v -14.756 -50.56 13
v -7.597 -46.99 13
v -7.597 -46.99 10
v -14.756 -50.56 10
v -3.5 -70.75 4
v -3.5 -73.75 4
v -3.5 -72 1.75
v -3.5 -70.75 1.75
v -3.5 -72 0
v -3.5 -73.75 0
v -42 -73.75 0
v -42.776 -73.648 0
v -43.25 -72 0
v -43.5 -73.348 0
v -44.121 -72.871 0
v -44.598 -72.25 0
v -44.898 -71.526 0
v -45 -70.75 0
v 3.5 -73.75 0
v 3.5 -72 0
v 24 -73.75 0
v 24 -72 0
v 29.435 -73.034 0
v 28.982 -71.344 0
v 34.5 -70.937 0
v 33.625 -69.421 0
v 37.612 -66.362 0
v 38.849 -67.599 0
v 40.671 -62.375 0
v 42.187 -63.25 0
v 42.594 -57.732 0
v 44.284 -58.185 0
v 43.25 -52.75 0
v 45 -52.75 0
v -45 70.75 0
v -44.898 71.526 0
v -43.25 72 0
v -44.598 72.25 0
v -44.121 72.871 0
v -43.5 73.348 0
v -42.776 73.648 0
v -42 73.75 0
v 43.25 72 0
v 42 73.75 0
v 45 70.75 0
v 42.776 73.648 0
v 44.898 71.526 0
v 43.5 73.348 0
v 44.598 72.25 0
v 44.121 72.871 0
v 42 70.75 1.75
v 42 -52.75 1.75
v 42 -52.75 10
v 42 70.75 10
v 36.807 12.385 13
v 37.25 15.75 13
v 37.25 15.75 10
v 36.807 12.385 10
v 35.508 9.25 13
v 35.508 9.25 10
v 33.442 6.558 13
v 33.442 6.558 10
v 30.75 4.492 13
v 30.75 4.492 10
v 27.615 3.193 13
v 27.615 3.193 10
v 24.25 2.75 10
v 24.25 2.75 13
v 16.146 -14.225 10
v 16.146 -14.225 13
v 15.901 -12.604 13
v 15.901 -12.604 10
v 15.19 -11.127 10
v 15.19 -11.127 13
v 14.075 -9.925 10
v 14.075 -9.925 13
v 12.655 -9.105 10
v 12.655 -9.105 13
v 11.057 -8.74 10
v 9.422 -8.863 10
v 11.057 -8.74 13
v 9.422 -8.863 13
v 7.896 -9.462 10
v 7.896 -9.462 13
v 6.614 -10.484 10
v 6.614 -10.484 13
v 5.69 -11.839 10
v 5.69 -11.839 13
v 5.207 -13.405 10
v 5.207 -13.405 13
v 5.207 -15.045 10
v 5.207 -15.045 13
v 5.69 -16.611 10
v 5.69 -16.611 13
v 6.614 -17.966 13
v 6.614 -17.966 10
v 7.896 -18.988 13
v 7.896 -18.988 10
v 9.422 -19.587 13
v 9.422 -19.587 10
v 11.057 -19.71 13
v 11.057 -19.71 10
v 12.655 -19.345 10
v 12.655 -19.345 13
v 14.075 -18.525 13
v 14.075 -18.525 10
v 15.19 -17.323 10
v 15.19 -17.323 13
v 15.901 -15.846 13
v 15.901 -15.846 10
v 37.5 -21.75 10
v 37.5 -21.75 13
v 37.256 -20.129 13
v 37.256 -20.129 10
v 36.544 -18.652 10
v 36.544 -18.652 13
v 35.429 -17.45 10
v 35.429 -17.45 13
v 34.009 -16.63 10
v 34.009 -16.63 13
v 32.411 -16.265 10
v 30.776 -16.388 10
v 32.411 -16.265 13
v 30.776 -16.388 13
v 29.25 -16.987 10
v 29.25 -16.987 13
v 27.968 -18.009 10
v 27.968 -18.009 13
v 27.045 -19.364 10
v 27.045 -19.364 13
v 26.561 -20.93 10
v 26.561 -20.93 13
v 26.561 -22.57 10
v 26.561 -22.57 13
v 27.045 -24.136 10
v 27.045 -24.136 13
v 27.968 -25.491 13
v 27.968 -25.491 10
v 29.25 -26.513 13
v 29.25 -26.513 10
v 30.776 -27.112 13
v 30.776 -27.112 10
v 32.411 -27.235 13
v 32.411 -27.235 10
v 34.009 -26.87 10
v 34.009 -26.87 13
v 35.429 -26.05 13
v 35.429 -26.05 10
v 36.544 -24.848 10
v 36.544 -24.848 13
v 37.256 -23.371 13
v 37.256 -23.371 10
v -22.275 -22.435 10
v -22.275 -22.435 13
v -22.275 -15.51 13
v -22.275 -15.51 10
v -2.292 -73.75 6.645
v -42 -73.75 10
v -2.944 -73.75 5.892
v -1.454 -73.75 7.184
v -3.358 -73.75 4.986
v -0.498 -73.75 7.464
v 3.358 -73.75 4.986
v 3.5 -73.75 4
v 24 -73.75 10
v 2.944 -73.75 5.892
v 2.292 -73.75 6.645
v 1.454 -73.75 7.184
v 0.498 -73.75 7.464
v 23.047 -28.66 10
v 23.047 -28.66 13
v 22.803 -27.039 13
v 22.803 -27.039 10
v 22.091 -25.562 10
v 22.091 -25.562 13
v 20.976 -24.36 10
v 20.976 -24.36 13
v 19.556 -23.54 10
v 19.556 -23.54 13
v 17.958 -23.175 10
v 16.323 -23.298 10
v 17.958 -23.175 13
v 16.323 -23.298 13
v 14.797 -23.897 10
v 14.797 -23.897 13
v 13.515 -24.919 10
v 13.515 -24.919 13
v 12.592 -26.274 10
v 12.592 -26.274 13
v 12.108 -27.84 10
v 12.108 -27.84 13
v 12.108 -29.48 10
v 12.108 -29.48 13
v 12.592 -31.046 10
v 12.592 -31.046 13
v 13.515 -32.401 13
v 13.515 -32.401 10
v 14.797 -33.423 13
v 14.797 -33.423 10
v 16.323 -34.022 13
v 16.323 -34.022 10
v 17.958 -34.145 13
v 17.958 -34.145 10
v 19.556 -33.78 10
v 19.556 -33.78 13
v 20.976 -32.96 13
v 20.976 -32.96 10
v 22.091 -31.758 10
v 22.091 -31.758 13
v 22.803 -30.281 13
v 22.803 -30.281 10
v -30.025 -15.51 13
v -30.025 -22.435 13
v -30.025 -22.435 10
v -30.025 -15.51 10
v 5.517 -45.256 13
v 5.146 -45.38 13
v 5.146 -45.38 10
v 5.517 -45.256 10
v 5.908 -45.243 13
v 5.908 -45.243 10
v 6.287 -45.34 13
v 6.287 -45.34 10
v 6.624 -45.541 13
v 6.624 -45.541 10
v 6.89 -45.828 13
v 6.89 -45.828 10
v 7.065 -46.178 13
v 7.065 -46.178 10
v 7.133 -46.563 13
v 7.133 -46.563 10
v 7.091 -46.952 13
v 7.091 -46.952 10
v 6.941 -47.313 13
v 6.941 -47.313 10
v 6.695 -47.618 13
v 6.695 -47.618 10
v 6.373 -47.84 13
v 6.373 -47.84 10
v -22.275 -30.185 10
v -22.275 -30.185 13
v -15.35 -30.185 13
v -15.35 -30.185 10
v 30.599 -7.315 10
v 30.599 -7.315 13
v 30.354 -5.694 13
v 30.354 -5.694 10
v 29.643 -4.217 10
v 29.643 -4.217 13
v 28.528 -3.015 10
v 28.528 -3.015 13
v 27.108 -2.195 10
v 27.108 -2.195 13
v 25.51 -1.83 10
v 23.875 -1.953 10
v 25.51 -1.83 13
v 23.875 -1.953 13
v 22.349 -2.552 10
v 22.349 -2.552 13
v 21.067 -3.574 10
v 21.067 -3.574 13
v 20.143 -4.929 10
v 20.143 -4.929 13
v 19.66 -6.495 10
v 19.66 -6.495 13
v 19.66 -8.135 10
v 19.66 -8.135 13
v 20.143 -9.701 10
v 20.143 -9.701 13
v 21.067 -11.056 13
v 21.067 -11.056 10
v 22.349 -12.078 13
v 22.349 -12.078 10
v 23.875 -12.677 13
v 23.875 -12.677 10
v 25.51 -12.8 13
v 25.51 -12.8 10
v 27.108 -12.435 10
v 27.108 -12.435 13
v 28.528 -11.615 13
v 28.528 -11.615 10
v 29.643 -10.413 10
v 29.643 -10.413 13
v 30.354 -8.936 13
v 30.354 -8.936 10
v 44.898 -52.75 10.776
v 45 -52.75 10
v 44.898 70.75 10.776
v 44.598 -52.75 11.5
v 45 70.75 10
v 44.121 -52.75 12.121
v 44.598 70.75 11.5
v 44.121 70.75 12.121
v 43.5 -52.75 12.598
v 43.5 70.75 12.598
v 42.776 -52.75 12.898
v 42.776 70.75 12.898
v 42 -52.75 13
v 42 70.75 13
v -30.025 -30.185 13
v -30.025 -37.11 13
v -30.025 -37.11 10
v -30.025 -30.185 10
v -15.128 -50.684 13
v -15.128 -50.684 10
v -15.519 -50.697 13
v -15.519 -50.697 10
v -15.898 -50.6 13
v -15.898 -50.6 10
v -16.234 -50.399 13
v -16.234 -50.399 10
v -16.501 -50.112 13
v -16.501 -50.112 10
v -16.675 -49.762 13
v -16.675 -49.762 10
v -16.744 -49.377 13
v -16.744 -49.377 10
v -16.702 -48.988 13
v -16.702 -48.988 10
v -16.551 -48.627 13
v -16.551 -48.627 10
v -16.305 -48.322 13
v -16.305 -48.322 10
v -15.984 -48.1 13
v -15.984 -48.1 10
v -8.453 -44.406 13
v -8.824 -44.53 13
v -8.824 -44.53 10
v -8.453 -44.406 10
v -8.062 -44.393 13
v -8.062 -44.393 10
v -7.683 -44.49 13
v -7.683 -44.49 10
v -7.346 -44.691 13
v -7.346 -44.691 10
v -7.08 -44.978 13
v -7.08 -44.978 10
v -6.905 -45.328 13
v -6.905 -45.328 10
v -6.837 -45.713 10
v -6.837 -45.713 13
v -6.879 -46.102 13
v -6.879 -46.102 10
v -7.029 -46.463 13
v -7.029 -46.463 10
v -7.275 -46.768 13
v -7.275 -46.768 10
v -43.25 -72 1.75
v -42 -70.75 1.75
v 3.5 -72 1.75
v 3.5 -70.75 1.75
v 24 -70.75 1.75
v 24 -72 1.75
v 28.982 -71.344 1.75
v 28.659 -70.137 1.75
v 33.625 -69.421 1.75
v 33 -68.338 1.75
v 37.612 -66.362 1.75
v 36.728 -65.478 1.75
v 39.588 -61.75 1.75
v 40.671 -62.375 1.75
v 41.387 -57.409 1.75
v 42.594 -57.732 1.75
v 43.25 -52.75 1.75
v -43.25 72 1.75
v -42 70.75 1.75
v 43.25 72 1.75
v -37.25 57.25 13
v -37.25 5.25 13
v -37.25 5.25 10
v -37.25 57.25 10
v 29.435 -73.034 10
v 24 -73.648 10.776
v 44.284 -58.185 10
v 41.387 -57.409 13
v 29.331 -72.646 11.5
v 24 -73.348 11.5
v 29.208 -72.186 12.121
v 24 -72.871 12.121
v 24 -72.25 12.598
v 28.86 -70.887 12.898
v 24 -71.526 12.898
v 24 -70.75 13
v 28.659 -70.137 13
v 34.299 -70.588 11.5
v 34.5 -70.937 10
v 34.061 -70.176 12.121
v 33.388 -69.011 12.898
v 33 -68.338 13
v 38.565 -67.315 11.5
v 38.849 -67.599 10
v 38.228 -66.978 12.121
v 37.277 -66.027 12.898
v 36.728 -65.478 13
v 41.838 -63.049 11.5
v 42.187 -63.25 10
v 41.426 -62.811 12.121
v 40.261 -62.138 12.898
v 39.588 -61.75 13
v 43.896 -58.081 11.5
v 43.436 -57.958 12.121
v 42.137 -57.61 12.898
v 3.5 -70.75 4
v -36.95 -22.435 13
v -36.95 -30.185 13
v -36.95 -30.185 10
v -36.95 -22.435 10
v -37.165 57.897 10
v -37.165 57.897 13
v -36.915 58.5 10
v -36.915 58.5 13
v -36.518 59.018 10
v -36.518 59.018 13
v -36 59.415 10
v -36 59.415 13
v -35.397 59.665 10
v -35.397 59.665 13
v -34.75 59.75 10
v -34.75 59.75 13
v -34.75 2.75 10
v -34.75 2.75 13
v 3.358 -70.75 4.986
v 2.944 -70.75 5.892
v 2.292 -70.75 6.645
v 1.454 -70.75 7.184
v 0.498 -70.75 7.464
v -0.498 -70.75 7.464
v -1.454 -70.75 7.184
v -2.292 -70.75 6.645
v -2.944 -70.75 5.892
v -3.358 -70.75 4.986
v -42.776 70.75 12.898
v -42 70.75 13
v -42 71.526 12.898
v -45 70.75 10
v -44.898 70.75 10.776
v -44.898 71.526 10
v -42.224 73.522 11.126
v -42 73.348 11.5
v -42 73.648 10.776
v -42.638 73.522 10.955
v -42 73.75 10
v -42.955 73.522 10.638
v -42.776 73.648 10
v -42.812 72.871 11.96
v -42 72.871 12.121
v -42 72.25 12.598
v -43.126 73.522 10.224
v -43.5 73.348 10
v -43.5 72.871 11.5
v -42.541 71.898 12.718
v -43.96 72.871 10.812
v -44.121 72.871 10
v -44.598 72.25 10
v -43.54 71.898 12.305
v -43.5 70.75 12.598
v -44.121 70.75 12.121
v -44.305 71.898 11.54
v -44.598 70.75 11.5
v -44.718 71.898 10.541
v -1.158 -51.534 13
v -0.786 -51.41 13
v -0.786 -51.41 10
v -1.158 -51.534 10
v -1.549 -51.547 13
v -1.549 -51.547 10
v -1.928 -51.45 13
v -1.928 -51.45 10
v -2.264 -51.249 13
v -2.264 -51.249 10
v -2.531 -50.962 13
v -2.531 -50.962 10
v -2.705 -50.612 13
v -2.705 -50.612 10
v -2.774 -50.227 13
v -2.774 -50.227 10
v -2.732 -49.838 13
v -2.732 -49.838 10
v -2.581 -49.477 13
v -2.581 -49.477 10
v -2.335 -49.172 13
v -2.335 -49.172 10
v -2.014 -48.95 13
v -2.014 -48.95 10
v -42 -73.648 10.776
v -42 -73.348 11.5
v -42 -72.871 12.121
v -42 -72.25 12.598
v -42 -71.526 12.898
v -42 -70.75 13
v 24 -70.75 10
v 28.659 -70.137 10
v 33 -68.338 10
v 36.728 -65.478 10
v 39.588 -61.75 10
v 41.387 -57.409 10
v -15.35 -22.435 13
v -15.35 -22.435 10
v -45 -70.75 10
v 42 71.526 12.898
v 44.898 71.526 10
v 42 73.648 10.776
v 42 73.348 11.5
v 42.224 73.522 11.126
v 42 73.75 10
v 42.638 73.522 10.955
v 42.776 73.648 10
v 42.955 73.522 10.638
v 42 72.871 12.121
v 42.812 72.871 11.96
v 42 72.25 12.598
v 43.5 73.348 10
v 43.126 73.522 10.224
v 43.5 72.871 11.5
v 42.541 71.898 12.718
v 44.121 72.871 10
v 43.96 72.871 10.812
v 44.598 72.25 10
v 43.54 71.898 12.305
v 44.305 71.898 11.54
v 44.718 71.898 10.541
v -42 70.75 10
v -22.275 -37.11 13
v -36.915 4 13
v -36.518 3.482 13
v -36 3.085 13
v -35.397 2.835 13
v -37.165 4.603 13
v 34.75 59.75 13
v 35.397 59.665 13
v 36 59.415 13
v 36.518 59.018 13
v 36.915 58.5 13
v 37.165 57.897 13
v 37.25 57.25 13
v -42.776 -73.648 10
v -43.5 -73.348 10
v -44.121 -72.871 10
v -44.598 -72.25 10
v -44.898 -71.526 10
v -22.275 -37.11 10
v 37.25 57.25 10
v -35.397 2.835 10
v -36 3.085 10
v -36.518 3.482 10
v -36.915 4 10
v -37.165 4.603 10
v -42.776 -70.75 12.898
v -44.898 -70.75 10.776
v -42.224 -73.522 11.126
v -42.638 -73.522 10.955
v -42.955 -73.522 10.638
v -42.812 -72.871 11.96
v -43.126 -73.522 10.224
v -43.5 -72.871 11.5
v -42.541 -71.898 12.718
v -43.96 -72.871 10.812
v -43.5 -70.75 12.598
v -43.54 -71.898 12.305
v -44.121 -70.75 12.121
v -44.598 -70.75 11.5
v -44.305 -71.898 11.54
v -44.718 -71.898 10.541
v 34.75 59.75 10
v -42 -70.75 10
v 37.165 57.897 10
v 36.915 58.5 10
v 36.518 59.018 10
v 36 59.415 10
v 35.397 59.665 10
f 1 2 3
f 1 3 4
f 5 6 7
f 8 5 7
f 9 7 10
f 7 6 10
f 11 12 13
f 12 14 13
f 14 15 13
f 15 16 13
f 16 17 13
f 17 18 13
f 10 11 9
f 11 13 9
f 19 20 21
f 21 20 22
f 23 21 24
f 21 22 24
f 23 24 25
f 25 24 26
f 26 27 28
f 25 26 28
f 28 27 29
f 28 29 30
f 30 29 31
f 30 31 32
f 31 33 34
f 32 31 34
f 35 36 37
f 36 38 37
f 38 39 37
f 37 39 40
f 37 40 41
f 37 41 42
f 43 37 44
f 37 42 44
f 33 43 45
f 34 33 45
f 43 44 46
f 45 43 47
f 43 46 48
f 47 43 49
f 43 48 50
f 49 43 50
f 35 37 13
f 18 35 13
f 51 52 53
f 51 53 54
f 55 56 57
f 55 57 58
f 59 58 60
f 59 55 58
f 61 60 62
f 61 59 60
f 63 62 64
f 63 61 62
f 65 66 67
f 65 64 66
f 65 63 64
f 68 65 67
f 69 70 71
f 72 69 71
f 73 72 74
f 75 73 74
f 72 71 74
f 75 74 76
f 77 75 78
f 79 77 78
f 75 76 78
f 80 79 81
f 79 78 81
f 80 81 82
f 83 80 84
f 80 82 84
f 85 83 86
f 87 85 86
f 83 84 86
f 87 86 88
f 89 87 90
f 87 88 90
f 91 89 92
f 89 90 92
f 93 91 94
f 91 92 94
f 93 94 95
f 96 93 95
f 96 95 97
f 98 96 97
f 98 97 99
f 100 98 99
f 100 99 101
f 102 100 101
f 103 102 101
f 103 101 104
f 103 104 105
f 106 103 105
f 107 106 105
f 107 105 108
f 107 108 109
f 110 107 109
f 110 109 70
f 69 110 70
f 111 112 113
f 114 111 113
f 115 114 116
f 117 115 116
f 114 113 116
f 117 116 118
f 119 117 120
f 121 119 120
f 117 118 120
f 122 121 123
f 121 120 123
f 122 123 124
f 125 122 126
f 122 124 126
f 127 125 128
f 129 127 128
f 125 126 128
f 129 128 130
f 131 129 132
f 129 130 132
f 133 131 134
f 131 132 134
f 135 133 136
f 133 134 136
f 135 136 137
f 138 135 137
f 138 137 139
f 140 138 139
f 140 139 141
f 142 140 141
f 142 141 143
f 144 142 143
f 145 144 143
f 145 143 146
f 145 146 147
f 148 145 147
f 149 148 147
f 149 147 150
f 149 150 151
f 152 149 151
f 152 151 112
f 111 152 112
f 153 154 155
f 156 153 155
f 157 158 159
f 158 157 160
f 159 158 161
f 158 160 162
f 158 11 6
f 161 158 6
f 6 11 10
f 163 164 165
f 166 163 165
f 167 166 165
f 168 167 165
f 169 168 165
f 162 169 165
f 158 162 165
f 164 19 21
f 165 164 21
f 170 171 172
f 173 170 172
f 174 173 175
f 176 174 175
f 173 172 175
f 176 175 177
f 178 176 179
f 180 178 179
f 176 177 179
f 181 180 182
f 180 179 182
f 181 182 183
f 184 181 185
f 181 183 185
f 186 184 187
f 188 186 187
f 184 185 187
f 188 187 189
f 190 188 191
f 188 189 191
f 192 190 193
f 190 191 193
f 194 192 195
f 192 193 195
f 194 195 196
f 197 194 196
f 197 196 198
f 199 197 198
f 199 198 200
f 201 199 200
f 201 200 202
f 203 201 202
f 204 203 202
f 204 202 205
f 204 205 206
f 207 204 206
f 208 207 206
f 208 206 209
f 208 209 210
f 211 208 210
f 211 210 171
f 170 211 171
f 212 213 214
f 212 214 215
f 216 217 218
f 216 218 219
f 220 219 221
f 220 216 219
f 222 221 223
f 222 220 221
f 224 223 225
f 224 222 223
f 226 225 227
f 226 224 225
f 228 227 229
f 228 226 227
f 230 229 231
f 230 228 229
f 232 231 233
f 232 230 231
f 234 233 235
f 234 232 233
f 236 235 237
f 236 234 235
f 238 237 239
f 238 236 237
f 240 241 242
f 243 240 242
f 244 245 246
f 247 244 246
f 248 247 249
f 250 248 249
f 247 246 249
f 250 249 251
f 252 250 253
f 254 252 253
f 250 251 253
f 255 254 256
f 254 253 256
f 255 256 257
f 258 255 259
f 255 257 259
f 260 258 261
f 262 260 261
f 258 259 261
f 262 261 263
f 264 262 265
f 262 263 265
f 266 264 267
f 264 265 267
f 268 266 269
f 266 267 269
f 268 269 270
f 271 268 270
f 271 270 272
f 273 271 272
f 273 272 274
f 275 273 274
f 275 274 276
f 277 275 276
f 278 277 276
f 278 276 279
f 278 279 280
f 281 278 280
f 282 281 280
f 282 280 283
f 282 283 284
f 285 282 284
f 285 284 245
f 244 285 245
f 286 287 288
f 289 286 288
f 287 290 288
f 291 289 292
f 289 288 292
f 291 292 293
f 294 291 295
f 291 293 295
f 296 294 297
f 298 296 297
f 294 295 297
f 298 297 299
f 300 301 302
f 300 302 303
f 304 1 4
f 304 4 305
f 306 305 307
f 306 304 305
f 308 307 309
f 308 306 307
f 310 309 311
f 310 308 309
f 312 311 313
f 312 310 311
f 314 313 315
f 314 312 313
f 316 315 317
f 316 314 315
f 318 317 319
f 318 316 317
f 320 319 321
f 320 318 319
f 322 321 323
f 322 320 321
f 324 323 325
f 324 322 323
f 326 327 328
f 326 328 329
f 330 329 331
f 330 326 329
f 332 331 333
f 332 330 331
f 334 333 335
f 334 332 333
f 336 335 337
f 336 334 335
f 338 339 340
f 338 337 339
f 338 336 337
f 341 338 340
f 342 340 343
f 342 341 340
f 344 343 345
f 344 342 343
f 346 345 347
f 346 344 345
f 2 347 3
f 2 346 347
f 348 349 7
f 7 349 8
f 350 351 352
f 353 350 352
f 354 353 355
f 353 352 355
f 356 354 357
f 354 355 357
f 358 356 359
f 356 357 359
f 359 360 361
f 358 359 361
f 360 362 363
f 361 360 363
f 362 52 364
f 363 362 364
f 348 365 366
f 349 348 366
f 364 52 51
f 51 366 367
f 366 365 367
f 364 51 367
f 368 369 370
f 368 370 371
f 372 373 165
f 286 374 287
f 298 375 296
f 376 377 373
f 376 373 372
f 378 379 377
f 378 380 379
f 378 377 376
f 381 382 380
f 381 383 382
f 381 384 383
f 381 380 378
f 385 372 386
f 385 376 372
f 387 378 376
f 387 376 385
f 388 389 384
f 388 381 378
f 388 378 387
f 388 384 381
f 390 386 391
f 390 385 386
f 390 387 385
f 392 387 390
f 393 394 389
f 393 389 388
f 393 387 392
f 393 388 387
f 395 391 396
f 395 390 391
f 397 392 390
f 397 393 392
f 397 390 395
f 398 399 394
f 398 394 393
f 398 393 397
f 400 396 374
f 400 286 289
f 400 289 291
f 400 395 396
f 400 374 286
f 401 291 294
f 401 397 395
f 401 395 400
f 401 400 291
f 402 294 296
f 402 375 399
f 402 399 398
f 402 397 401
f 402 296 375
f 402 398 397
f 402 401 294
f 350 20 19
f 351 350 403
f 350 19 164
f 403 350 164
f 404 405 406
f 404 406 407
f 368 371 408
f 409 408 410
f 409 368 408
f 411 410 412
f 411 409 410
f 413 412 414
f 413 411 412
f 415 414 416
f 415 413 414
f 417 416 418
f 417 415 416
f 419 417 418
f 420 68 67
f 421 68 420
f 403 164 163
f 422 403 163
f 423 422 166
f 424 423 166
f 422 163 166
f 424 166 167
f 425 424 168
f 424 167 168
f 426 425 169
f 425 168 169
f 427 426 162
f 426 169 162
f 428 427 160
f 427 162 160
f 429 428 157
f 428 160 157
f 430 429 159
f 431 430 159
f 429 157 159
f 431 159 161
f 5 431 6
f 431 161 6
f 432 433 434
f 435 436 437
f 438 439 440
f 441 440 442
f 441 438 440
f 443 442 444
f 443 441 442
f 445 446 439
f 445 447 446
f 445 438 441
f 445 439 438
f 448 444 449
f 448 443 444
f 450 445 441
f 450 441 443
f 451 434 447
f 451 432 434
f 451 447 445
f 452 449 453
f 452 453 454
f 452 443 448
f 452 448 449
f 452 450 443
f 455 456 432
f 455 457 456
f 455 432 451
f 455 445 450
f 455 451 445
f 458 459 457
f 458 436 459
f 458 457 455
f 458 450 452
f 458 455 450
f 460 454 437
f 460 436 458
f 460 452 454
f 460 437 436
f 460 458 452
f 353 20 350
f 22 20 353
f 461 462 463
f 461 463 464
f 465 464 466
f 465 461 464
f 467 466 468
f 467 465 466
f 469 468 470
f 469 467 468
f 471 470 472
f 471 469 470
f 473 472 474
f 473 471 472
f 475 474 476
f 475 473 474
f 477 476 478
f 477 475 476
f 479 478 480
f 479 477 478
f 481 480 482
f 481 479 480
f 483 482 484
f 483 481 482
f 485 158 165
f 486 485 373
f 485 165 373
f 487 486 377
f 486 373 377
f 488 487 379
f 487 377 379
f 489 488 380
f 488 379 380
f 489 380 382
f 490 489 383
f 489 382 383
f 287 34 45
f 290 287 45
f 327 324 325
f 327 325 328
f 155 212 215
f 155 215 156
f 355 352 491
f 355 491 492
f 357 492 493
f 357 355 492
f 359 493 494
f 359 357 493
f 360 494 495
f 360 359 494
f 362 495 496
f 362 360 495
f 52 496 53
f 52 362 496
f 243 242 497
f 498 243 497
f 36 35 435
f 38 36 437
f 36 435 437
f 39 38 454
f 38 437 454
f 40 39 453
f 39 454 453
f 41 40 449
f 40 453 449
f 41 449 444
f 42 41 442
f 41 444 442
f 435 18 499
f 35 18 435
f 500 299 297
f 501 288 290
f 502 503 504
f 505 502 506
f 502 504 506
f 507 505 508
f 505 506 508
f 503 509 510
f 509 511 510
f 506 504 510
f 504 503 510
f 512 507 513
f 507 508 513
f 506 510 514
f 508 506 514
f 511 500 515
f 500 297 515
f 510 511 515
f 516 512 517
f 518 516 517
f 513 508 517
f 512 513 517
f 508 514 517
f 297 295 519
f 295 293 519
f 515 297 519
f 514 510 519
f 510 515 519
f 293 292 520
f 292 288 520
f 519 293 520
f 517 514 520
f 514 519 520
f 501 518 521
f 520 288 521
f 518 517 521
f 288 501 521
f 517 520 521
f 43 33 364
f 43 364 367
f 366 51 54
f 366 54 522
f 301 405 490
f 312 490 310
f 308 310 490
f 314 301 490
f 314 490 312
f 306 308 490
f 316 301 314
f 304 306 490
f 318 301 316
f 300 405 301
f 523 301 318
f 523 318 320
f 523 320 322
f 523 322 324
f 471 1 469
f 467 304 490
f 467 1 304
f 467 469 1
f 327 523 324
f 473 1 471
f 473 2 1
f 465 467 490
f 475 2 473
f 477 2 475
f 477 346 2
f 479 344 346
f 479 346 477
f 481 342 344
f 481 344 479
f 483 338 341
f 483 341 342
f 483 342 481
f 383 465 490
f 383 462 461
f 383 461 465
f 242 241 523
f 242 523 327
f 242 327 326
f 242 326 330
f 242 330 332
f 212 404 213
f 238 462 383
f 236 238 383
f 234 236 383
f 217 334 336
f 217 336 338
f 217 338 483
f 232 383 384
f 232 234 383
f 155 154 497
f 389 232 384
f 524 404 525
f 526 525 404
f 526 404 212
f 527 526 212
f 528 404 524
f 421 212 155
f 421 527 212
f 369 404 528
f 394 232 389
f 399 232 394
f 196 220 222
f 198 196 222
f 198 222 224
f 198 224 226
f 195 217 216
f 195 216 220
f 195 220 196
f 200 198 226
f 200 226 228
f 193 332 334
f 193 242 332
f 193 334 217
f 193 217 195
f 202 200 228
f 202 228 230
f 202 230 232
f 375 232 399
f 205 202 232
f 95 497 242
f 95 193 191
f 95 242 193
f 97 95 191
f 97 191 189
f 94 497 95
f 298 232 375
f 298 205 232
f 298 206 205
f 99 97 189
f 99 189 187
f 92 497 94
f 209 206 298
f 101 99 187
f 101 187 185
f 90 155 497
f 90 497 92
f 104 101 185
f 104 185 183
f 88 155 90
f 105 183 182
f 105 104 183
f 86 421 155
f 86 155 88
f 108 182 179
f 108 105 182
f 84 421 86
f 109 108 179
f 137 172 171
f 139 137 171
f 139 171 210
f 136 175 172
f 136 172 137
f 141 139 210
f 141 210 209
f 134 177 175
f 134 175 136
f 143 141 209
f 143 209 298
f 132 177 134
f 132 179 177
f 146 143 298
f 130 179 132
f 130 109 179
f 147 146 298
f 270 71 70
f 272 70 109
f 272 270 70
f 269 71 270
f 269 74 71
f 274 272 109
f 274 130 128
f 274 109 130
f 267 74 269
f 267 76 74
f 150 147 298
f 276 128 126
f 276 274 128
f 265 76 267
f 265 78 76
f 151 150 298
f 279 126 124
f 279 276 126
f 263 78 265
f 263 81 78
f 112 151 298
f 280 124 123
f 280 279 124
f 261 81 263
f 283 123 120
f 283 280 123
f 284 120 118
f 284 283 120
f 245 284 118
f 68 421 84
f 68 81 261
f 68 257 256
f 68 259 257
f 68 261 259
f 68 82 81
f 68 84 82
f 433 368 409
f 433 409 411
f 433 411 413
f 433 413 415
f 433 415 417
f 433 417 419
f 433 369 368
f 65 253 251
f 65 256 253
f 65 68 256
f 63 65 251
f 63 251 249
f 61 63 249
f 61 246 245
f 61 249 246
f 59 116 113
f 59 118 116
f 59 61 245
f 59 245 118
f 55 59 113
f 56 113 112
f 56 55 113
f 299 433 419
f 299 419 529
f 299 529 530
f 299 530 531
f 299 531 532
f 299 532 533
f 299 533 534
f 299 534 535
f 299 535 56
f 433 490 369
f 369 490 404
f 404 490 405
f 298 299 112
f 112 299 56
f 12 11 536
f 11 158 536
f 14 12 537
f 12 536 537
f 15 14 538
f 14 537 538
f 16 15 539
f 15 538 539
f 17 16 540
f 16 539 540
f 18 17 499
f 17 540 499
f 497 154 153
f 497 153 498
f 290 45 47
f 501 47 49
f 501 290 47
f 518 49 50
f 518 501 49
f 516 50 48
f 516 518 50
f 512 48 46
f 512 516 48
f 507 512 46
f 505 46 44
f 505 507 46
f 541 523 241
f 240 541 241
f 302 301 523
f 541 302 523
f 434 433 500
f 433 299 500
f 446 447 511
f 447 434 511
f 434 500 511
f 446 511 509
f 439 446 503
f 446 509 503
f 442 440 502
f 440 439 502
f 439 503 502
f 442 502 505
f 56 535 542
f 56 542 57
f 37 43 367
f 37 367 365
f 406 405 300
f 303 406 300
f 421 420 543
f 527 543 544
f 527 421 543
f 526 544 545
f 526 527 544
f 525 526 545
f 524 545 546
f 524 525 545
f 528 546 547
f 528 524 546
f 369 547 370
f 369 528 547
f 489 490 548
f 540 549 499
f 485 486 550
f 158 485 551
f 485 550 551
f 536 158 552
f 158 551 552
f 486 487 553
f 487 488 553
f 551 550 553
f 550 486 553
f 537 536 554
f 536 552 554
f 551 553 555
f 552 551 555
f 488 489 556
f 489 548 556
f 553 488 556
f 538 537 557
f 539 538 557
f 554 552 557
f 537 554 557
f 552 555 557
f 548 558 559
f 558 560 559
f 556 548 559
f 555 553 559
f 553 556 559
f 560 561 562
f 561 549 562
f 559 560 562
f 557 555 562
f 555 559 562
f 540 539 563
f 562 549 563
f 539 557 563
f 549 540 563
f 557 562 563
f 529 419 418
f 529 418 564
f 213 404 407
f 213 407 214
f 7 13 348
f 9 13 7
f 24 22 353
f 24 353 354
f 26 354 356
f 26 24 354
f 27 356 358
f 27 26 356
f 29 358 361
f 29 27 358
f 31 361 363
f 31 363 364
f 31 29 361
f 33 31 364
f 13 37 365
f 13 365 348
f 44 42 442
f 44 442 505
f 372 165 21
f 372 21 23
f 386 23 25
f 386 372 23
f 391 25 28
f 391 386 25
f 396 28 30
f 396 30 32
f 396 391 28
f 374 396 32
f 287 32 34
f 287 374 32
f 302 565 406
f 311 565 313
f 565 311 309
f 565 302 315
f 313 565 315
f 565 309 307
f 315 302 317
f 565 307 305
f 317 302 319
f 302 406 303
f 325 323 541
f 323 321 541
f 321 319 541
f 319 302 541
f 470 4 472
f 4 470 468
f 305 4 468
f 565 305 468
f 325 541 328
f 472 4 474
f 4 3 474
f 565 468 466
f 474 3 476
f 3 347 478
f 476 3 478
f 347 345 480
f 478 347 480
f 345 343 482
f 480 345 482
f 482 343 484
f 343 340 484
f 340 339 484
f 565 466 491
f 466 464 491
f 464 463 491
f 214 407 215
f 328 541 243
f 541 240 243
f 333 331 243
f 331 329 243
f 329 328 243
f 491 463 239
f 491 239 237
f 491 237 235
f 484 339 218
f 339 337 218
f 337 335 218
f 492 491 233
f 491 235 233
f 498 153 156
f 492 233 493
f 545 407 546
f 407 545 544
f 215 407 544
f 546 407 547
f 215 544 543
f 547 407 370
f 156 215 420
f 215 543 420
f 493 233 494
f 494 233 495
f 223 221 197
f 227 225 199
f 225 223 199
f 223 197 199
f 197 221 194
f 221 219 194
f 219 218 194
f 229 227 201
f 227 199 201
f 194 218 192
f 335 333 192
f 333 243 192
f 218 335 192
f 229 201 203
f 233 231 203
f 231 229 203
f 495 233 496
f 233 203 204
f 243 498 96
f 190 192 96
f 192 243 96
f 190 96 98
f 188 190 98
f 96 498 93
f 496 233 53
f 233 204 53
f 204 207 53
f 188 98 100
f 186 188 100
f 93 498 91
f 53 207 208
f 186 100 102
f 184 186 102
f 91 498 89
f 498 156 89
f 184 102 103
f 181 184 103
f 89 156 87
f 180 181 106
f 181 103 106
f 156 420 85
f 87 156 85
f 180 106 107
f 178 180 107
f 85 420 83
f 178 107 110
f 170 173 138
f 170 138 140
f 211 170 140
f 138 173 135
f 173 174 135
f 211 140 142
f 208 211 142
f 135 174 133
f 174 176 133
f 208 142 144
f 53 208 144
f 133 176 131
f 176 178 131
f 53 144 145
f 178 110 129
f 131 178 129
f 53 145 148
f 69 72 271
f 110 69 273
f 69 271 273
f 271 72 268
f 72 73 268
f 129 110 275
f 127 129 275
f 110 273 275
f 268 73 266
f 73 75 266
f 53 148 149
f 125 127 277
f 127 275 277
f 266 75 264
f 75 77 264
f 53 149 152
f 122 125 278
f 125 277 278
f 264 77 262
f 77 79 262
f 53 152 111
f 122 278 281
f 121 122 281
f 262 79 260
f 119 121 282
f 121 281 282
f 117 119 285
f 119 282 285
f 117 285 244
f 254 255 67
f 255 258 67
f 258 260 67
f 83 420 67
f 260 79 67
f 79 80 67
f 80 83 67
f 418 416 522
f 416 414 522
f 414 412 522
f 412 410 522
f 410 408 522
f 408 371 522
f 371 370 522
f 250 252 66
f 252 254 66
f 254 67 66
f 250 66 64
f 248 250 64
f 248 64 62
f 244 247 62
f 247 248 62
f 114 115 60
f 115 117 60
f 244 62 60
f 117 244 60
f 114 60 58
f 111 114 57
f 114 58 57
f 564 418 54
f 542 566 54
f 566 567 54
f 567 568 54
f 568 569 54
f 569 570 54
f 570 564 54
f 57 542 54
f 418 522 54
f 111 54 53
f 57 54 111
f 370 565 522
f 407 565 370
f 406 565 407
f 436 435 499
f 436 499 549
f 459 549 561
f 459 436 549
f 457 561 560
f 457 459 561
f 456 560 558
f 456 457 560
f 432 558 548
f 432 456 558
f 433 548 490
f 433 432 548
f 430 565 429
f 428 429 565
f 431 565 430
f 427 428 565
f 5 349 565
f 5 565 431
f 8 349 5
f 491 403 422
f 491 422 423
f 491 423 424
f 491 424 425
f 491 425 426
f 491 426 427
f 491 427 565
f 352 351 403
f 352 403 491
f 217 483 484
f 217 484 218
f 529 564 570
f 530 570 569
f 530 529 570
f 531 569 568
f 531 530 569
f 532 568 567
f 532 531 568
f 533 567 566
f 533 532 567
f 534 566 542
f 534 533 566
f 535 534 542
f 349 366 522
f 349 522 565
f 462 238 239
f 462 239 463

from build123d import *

# Parameters (mm, degrees)
SKETCH1_W               = 90
SKETCH1_H               = 147.5
BOSS_EXTRUDE1_DEPTH     = 13
ROUNDED_BOTTOM_CORNER_R = 21
ROUND_EDGES_R           = 3
SHELL2_DEPTH            = 10
CUT_EXTRUDE1_DEPTH      = 88.367399526
CUT_EXTRUDE2_DEPTH      = 1.75
CUT_EXTRUDE3_REACH      = 156.759
SKETCH6_R               = 5.5
CUT_EXTRUDE4_DEPTH      = 88.367399526
SKETCH7_W               = 7.75
SKETCH7_H               = 21.6
SKETCH7_W_2             = 21.6
SKETCH7_H_2             = 7.75
CUT_EXTRUDE5_DEPTH      = 88.367399526
CUT_EXTRUDE6_DEPTH      = 88.367399526


# Read off the part's stored shape, not the designer's step: Shell2
with BuildPart() as part:
    # Sketch1 → Boss-Extrude1 (new body)
    with BuildSketch(Plane.XY):
        Rectangle(SKETCH1_W, SKETCH1_H)
    extrude(amount=BOSS_EXTRUDE1_DEPTH)

    # Rounded Bottom Corner
    rounded_bottom_corner_edges = [part.edges().sort_by_distance(p)[0] for p in [
        (45, -73.75, 6.5),
    ]]
    fillet(rounded_bottom_corner_edges, radius=ROUNDED_BOTTOM_CORNER_R)

    # Round Edges
    round_edges_edges = [part.edges().sort_by_distance(p)[0] for p in [
        (-45, 0, 13),
        (-10.5, -73.75, 13),
        (45, 10.5, 13),
        (38.849242405, -67.599242405, 13),
        (0, 73.75, 13),
        (-45, -73.75, 6.5),
        (-45, 73.75, 6.5),
        (45, 73.75, 6.5),
    ]]
    fillet(round_edges_edges, radius=ROUND_EDGES_R)

    # Shell2 outline → Shell2 (cut)
    with BuildSketch(Plane.XY):
        with BuildLine():
            Line((42, -52.75), (42, 70.75))
            Line((42, 70.75), (-42, 70.75))
            Line((-42, 70.75), (-42, -70.75))
            Line((-42, -70.75), (24, -70.75))
            ThreePointArc((24, -70.75), (36.727922061, -65.477922061), (42, -52.75))
        make_face()
    extrude(amount=SHELL2_DEPTH, mode=Mode.SUBTRACT)

    # Sketch2 → Cut-Extrude1 (cut, through all)
    with BuildSketch(Plane.XY.offset(13)):
        with BuildLine():
            Line((-34.75, 59.75), (34.75, 59.75))
            ThreePointArc((34.75, 59.75), (36.517766953, 59.017766953), (37.25, 57.25))
            Line((37.25, 57.25), (37.25, 15.75))
            ThreePointArc((37.25, 15.75), (33.442388155, 6.557611845), (24.25, 2.75))
            Line((24.25, 2.75), (-34.75, 2.75))
            ThreePointArc((-34.75, 2.75), (-36.517766953, 3.482233047), (-37.25, 5.25))
            Line((-37.25, 5.25), (-37.25, 57.25))
            ThreePointArc((-37.25, 57.25), (-36.517766953, 59.017766953), (-34.75, 59.75))
        make_face()
    extrude(amount=-CUT_EXTRUDE1_DEPTH, mode=Mode.SUBTRACT)

    # Sketch3 → Cut-Extrude2 (cut)
    with BuildSketch(Plane(origin=(0, 0, 0), x_dir=(-1, 0, 0), z_dir=(0, 0, -1))):
        with BuildLine():
            Line((-43.25, -52.75), (-43.25, 72))
            Line((-43.25, 72), (43.25, 72))
            Line((43.25, 72), (43.25, -72))
            Line((43.25, -72), (-24, -72))
            ThreePointArc((-24, -72), (-37.611805538, -66.361805538), (-43.25, -52.75))
        make_face()
        with BuildLine():
            Line((-42, -52.75), (-42, 70.75))
            Line((-42, 70.75), (42, 70.75))
            Line((42, 70.75), (42, -70.75))
            Line((42, -70.75), (-24, -70.75))
            ThreePointArc((-24, -70.75), (-36.727922061, -65.477922061), (-42, -52.75))
        make_face(mode=Mode.SUBTRACT)
    extrude(amount=-CUT_EXTRUDE2_DEPTH, mode=Mode.SUBTRACT)

    # Sketch4 → Cut-Extrude3 (cut, up to next)
    with BuildSketch(Plane.XZ.offset(73.75), mode=Mode.PRIVATE) as cut_extrude3_sk1:
        with BuildLine():
            Line((-3.5, 0), (3.5, 0))
            Line((3.5, 0), (3.5, 4))
            ThreePointArc((3.5, 4), (0, 7.5), (-3.5, 4))
            Line((-3.5, 4), (-3.5, 0))
        make_face()
    cut_extrude3_tool1 = extrude(cut_extrude3_sk1.sketch, amount=-CUT_EXTRUDE3_REACH, mode=Mode.PRIVATE) & part.part
    add(cut_extrude3_tool1.solids().sort_by_distance((0, -73.75, 3.419658))[0], mode=Mode.SUBTRACT)

    # Sketch6 → Cut-Extrude4 (cut, through all)
    with BuildSketch(Plane.XY.offset(13)):
        with Locations((32, -21.75)):
            Circle(SKETCH6_R)
        with Locations((17.546893068, -28.66)):
            Circle(SKETCH6_R)
        with Locations((25.098626717, -7.314936896)):
            Circle(SKETCH6_R)
        with Locations((10.645519784, -14.224936896)):
            Circle(SKETCH6_R)
    extrude(amount=-CUT_EXTRUDE4_DEPTH, mode=Mode.SUBTRACT)

    # Sketch7 → Cut-Extrude5 (cut, through all)
    with BuildSketch(Plane.XY.offset(13)):
        with Locations((-26.15, -26.31)):
            Rectangle(SKETCH7_W, SKETCH7_H)
        with Locations((-26.15, -26.31)):
            Rectangle(SKETCH7_W_2, SKETCH7_H_2)
    extrude(amount=-CUT_EXTRUDE5_DEPTH, mode=Mode.SUBTRACT)

    # Sketch8 → Cut-Extrude6 (cut, through all)
    with BuildSketch(Plane.XY.offset(13)):
        with BuildLine():
            Line((-2.01359375, -48.949501032), (5.145672972, -45.379501032))
            ThreePointArc((5.145672972, -45.379501032), (6.98976569, -45.99640625), (6.372860472, -47.840498968))
            Line((6.372860472, -47.840498968), (-0.78640625, -51.410498968))
            ThreePointArc((-0.78640625, -51.410498968), (-2.630498968, -50.79359375), (-2.01359375, -48.949501032))
        make_face()
        with BuildLine():
            Line((-15.98359375, -48.099501032), (-8.824327028, -44.529501032))
            ThreePointArc((-8.824327028, -44.529501032), (-6.98023431, -45.14640625), (-7.597139528, -46.990498968))
            Line((-7.597139528, -46.990498968), (-14.75640625, -50.560498968))
            ThreePointArc((-14.75640625, -50.560498968), (-16.600498968, -49.94359375), (-15.98359375, -48.099501032))
        make_face()
    extrude(amount=-CUT_EXTRUDE6_DEPTH, mode=Mode.SUBTRACT)


solid = part.part
